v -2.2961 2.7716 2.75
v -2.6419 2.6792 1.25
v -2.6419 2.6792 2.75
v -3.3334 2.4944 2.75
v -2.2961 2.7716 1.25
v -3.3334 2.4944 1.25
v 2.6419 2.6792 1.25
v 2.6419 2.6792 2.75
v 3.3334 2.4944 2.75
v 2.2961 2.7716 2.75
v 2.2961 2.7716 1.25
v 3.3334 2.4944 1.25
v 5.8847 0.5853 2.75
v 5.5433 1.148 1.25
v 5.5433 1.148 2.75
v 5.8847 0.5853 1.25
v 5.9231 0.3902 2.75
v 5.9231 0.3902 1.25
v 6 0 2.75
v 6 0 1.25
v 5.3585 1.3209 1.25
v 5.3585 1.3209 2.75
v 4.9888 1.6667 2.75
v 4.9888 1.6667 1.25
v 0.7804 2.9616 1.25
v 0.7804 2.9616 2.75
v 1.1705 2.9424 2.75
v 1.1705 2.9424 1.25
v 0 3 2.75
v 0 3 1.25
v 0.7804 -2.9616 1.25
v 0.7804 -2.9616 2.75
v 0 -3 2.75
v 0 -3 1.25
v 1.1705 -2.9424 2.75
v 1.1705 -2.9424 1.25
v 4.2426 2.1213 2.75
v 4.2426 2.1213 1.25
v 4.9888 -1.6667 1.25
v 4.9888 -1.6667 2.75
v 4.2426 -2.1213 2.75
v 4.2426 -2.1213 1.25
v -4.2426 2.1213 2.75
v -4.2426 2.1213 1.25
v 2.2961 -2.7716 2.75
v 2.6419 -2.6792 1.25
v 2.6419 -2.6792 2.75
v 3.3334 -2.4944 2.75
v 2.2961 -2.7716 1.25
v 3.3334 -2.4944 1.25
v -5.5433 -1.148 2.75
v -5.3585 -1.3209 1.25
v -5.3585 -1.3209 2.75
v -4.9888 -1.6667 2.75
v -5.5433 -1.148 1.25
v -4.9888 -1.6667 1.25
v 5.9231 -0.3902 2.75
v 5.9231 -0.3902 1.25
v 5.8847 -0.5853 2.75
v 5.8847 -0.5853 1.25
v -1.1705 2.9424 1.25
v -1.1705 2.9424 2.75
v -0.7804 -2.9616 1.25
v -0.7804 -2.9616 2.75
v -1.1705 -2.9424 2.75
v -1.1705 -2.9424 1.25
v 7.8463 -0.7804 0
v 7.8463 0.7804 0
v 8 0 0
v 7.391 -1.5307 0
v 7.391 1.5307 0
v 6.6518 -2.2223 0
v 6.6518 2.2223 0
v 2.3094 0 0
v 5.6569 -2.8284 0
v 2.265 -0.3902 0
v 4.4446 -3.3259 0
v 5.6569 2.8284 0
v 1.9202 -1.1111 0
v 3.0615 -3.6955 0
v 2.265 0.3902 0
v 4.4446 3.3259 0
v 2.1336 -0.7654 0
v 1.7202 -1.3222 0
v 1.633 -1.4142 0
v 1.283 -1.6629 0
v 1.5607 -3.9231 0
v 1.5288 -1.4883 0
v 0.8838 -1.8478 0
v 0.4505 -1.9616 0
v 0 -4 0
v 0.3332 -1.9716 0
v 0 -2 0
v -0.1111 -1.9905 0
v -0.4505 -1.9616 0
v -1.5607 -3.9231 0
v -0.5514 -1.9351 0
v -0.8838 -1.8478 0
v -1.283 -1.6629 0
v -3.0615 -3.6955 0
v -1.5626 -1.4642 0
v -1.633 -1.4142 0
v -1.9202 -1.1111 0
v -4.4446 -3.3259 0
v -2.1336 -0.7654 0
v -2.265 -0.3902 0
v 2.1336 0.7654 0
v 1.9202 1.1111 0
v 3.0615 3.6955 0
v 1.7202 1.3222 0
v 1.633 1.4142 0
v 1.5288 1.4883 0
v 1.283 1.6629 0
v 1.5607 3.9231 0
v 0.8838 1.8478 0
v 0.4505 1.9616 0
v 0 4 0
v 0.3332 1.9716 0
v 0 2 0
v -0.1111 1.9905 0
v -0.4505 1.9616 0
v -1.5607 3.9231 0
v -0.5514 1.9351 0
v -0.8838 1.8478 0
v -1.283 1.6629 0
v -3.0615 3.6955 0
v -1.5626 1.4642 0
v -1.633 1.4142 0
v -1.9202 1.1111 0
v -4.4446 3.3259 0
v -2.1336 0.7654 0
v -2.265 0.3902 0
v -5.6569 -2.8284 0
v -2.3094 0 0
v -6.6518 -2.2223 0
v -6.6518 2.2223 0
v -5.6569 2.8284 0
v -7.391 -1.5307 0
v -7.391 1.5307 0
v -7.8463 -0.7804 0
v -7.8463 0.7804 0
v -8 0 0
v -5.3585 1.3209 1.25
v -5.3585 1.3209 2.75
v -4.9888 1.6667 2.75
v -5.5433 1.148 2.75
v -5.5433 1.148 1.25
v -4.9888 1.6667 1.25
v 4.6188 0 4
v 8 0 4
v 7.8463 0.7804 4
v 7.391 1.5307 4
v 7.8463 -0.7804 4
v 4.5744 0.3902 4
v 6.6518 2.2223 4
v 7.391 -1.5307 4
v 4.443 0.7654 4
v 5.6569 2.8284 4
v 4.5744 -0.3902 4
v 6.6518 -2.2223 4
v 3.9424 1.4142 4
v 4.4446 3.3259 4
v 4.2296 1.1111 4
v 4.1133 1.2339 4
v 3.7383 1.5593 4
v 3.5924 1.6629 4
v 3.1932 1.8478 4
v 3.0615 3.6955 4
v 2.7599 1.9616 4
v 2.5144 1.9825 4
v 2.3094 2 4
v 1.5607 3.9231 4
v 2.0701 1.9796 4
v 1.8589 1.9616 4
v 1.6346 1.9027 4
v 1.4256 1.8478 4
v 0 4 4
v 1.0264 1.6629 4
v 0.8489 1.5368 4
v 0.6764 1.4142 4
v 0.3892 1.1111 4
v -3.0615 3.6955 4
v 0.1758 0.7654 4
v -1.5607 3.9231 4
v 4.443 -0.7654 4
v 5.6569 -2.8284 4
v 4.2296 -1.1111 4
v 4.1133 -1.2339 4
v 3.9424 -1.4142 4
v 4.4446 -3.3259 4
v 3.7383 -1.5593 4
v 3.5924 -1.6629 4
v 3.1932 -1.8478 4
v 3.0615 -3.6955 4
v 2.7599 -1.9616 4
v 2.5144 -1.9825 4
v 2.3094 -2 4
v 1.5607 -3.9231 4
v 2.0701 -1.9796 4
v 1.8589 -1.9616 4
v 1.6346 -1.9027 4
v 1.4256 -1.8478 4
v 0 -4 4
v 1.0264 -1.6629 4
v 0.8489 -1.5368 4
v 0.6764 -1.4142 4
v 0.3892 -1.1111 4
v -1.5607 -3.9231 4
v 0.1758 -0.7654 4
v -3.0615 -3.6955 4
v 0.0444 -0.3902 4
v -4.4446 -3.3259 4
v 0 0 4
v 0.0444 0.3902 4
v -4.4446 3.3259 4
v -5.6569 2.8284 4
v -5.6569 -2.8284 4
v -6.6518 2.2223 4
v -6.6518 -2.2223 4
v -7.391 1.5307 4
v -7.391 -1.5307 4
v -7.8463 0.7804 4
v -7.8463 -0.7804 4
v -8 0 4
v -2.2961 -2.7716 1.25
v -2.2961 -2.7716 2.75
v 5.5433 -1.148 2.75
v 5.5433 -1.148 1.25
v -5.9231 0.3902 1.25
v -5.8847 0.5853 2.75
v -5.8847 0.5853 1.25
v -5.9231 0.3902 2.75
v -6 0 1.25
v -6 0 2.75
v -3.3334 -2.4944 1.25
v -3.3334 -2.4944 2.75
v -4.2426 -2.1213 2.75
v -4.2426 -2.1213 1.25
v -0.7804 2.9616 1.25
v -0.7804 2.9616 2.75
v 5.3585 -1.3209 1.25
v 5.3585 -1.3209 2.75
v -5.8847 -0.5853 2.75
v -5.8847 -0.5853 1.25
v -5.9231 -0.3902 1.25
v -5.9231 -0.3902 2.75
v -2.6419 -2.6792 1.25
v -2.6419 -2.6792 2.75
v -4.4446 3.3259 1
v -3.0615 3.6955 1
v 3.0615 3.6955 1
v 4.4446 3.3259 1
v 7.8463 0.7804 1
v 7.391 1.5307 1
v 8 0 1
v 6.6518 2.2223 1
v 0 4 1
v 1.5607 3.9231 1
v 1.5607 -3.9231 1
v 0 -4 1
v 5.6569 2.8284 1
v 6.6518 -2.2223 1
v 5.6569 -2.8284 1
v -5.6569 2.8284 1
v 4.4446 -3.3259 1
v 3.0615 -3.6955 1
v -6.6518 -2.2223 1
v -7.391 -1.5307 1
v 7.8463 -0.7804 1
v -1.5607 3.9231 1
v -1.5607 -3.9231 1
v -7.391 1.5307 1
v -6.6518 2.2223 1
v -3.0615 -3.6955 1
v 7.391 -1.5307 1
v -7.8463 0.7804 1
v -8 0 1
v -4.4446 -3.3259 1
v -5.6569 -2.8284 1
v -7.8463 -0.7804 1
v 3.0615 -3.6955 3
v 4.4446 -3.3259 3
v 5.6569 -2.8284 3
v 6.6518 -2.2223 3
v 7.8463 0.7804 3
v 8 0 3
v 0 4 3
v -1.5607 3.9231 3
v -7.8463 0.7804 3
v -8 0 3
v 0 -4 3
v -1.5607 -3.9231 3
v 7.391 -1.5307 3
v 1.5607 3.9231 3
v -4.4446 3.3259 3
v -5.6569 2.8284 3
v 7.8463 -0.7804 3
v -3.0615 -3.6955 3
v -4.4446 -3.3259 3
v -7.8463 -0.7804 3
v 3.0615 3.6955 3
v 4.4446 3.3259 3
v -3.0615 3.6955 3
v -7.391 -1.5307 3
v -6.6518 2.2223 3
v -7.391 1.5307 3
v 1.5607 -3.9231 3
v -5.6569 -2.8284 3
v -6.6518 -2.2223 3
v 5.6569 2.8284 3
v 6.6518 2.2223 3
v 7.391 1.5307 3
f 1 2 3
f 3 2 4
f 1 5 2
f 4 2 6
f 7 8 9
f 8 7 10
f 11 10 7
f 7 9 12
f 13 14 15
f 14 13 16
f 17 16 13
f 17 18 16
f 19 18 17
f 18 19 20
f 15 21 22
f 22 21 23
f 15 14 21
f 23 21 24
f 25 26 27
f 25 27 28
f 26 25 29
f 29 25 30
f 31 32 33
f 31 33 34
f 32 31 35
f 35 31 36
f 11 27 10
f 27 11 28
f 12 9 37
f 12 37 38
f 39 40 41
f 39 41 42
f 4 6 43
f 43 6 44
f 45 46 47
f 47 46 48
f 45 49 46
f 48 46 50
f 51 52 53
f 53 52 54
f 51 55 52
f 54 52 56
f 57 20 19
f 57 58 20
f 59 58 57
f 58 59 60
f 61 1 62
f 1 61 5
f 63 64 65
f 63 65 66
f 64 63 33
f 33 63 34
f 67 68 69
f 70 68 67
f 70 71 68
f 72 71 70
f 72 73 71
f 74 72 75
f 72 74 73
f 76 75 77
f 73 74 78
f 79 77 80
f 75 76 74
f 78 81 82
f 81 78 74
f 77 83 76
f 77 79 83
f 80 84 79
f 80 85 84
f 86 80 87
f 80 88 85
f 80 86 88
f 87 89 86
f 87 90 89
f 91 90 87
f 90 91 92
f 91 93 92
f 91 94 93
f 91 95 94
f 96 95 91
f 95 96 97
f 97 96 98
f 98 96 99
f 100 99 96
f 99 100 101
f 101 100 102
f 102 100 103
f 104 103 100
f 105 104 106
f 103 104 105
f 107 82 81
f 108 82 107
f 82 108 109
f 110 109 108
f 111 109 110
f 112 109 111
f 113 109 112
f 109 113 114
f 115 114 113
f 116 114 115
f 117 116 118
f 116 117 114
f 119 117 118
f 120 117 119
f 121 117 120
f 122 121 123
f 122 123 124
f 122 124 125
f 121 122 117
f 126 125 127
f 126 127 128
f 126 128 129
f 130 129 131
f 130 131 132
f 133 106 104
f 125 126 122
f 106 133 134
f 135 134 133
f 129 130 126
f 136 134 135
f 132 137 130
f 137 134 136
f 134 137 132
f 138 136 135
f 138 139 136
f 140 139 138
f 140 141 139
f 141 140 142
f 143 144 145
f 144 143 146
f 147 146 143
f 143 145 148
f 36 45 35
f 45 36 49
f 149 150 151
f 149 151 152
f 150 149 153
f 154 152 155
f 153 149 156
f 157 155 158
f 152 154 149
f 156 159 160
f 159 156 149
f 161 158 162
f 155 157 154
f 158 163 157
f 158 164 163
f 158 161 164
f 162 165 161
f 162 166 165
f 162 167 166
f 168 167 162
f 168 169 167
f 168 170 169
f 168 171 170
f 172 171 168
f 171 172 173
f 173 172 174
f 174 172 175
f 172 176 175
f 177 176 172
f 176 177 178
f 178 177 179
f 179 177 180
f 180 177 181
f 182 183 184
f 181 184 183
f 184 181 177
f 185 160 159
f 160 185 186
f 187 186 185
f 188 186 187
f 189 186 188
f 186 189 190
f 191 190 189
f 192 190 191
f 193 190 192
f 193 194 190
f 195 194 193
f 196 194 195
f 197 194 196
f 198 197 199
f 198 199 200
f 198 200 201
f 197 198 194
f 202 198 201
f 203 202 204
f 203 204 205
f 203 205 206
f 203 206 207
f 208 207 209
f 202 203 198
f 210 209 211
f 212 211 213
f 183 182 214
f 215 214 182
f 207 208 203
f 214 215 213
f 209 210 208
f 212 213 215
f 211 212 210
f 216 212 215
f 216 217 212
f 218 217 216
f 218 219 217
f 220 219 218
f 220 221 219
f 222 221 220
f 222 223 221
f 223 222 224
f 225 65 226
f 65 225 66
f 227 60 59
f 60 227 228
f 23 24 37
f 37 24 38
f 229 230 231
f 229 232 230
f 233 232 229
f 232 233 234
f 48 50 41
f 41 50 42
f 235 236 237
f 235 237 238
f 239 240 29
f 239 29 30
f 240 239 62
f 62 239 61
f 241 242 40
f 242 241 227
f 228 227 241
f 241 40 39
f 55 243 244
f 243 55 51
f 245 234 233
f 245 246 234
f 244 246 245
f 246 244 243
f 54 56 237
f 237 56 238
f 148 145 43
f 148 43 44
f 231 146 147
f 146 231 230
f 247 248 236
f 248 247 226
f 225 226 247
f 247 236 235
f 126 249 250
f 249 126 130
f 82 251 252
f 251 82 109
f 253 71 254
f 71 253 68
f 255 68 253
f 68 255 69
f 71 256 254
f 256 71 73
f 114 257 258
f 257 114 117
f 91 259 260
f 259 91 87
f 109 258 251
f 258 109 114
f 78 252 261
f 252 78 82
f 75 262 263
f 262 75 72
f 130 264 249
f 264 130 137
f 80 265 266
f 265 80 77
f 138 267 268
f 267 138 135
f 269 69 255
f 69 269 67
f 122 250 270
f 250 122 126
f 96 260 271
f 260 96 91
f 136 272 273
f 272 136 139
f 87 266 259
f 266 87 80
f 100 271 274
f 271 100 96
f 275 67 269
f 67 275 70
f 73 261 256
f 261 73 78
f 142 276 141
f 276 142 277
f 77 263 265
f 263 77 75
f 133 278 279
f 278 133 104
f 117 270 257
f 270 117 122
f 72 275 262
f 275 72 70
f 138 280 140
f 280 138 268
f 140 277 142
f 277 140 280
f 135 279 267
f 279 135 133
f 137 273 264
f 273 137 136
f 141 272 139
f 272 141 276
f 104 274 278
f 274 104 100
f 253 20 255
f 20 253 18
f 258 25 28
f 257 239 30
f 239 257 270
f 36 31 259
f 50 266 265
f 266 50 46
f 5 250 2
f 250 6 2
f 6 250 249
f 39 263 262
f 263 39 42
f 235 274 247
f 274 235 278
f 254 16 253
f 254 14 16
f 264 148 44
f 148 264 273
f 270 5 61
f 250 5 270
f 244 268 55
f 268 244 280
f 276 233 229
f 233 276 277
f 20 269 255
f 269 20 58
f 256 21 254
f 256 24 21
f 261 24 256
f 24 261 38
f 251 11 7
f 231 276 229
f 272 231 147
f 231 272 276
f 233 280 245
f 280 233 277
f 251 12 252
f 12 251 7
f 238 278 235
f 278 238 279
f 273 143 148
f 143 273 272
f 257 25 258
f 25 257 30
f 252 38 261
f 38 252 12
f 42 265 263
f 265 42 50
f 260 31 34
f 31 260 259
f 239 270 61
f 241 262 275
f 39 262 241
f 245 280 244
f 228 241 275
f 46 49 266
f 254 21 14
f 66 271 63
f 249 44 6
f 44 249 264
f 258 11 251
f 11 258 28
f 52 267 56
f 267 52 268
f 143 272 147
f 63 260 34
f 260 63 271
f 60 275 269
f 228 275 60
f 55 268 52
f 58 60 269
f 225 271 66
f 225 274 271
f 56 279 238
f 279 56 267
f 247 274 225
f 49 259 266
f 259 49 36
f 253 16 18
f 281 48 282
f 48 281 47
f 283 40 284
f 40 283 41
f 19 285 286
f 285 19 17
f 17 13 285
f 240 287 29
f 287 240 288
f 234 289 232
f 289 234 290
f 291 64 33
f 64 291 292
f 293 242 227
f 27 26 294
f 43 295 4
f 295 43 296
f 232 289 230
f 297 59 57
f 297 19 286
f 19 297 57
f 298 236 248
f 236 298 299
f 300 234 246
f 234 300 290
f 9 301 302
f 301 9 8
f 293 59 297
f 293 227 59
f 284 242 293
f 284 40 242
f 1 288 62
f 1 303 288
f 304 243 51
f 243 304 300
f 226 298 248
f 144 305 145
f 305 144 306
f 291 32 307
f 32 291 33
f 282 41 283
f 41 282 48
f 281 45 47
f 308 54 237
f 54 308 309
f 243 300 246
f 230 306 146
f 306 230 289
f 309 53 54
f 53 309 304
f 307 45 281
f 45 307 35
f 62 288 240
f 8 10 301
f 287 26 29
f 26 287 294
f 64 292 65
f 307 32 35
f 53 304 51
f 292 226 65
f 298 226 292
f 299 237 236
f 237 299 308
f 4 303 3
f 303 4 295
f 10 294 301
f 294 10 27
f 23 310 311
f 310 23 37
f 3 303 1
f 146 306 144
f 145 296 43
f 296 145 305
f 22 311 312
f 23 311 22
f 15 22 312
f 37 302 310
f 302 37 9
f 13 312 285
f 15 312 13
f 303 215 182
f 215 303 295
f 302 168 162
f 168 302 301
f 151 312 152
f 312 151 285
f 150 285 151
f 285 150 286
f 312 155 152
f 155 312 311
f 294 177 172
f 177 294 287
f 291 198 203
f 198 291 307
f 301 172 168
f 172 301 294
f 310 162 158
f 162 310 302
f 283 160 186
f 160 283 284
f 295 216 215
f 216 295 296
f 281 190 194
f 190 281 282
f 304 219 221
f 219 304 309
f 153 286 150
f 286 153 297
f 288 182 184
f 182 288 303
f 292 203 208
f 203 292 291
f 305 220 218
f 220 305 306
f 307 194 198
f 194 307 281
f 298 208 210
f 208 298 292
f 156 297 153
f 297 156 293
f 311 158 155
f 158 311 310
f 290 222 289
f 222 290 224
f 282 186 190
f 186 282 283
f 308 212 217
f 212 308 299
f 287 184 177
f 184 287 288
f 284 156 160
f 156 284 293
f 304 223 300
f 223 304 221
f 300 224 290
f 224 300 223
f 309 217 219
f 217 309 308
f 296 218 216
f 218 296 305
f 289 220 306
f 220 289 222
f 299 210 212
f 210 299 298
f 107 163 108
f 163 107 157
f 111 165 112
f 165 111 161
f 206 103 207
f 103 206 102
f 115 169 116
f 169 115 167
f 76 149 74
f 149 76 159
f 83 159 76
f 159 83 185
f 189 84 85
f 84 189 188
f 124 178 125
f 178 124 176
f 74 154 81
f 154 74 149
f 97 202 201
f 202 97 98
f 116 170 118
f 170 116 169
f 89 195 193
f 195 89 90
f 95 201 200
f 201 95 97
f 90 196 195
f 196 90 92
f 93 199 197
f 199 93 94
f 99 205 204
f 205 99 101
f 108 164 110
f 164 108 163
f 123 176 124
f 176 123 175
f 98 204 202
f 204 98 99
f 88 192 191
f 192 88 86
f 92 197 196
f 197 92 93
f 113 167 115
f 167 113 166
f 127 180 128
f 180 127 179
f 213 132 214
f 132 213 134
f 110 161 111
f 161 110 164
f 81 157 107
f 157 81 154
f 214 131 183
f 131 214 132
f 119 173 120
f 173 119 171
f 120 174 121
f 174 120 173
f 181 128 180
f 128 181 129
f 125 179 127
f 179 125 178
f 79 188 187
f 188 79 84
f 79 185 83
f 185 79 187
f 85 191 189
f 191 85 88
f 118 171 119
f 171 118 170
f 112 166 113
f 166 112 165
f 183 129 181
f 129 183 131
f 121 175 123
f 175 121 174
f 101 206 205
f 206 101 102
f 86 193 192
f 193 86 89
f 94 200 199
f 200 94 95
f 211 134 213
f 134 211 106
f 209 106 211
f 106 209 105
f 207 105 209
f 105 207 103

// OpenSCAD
$fn =32;
module peep(
height			= 4,
outer_diameter	= 8,
inner_diameter	= 4,
string_width	= 1,
angle			= 30){
	difference(){
		scale([ 2, 1, 1]){
			union(){
				cylinder( height, outer_diameter/2 - string_width, outer_diameter/2 - string_width);
				cylinder( height /2 - string_width, outer_diameter/2, outer_diameter/2);
				translate([ 0, 0, height /2 - string_width]){
					cylinder( string_width/2, outer_diameter/2, inner_diameter/2);
				}
				translate([ 0, 0, height /2 + string_width/2]){
					cylinder( string_width/2, inner_diameter/2, outer_diameter/2);
				}
				translate([ 0, 0, height/2 + string_width])
					{cylinder(( height/2 - string_width) , outer_diameter/2, outer_diameter/2); 
				}
			}
		}
		union(){
			rotate([ 0, angle, 0]){ translate([ 0, 0, - height]){
				cylinder( height*4, inner_diameter/2, inner_diameter/2);
			}}
		}
	}
}
peep();
